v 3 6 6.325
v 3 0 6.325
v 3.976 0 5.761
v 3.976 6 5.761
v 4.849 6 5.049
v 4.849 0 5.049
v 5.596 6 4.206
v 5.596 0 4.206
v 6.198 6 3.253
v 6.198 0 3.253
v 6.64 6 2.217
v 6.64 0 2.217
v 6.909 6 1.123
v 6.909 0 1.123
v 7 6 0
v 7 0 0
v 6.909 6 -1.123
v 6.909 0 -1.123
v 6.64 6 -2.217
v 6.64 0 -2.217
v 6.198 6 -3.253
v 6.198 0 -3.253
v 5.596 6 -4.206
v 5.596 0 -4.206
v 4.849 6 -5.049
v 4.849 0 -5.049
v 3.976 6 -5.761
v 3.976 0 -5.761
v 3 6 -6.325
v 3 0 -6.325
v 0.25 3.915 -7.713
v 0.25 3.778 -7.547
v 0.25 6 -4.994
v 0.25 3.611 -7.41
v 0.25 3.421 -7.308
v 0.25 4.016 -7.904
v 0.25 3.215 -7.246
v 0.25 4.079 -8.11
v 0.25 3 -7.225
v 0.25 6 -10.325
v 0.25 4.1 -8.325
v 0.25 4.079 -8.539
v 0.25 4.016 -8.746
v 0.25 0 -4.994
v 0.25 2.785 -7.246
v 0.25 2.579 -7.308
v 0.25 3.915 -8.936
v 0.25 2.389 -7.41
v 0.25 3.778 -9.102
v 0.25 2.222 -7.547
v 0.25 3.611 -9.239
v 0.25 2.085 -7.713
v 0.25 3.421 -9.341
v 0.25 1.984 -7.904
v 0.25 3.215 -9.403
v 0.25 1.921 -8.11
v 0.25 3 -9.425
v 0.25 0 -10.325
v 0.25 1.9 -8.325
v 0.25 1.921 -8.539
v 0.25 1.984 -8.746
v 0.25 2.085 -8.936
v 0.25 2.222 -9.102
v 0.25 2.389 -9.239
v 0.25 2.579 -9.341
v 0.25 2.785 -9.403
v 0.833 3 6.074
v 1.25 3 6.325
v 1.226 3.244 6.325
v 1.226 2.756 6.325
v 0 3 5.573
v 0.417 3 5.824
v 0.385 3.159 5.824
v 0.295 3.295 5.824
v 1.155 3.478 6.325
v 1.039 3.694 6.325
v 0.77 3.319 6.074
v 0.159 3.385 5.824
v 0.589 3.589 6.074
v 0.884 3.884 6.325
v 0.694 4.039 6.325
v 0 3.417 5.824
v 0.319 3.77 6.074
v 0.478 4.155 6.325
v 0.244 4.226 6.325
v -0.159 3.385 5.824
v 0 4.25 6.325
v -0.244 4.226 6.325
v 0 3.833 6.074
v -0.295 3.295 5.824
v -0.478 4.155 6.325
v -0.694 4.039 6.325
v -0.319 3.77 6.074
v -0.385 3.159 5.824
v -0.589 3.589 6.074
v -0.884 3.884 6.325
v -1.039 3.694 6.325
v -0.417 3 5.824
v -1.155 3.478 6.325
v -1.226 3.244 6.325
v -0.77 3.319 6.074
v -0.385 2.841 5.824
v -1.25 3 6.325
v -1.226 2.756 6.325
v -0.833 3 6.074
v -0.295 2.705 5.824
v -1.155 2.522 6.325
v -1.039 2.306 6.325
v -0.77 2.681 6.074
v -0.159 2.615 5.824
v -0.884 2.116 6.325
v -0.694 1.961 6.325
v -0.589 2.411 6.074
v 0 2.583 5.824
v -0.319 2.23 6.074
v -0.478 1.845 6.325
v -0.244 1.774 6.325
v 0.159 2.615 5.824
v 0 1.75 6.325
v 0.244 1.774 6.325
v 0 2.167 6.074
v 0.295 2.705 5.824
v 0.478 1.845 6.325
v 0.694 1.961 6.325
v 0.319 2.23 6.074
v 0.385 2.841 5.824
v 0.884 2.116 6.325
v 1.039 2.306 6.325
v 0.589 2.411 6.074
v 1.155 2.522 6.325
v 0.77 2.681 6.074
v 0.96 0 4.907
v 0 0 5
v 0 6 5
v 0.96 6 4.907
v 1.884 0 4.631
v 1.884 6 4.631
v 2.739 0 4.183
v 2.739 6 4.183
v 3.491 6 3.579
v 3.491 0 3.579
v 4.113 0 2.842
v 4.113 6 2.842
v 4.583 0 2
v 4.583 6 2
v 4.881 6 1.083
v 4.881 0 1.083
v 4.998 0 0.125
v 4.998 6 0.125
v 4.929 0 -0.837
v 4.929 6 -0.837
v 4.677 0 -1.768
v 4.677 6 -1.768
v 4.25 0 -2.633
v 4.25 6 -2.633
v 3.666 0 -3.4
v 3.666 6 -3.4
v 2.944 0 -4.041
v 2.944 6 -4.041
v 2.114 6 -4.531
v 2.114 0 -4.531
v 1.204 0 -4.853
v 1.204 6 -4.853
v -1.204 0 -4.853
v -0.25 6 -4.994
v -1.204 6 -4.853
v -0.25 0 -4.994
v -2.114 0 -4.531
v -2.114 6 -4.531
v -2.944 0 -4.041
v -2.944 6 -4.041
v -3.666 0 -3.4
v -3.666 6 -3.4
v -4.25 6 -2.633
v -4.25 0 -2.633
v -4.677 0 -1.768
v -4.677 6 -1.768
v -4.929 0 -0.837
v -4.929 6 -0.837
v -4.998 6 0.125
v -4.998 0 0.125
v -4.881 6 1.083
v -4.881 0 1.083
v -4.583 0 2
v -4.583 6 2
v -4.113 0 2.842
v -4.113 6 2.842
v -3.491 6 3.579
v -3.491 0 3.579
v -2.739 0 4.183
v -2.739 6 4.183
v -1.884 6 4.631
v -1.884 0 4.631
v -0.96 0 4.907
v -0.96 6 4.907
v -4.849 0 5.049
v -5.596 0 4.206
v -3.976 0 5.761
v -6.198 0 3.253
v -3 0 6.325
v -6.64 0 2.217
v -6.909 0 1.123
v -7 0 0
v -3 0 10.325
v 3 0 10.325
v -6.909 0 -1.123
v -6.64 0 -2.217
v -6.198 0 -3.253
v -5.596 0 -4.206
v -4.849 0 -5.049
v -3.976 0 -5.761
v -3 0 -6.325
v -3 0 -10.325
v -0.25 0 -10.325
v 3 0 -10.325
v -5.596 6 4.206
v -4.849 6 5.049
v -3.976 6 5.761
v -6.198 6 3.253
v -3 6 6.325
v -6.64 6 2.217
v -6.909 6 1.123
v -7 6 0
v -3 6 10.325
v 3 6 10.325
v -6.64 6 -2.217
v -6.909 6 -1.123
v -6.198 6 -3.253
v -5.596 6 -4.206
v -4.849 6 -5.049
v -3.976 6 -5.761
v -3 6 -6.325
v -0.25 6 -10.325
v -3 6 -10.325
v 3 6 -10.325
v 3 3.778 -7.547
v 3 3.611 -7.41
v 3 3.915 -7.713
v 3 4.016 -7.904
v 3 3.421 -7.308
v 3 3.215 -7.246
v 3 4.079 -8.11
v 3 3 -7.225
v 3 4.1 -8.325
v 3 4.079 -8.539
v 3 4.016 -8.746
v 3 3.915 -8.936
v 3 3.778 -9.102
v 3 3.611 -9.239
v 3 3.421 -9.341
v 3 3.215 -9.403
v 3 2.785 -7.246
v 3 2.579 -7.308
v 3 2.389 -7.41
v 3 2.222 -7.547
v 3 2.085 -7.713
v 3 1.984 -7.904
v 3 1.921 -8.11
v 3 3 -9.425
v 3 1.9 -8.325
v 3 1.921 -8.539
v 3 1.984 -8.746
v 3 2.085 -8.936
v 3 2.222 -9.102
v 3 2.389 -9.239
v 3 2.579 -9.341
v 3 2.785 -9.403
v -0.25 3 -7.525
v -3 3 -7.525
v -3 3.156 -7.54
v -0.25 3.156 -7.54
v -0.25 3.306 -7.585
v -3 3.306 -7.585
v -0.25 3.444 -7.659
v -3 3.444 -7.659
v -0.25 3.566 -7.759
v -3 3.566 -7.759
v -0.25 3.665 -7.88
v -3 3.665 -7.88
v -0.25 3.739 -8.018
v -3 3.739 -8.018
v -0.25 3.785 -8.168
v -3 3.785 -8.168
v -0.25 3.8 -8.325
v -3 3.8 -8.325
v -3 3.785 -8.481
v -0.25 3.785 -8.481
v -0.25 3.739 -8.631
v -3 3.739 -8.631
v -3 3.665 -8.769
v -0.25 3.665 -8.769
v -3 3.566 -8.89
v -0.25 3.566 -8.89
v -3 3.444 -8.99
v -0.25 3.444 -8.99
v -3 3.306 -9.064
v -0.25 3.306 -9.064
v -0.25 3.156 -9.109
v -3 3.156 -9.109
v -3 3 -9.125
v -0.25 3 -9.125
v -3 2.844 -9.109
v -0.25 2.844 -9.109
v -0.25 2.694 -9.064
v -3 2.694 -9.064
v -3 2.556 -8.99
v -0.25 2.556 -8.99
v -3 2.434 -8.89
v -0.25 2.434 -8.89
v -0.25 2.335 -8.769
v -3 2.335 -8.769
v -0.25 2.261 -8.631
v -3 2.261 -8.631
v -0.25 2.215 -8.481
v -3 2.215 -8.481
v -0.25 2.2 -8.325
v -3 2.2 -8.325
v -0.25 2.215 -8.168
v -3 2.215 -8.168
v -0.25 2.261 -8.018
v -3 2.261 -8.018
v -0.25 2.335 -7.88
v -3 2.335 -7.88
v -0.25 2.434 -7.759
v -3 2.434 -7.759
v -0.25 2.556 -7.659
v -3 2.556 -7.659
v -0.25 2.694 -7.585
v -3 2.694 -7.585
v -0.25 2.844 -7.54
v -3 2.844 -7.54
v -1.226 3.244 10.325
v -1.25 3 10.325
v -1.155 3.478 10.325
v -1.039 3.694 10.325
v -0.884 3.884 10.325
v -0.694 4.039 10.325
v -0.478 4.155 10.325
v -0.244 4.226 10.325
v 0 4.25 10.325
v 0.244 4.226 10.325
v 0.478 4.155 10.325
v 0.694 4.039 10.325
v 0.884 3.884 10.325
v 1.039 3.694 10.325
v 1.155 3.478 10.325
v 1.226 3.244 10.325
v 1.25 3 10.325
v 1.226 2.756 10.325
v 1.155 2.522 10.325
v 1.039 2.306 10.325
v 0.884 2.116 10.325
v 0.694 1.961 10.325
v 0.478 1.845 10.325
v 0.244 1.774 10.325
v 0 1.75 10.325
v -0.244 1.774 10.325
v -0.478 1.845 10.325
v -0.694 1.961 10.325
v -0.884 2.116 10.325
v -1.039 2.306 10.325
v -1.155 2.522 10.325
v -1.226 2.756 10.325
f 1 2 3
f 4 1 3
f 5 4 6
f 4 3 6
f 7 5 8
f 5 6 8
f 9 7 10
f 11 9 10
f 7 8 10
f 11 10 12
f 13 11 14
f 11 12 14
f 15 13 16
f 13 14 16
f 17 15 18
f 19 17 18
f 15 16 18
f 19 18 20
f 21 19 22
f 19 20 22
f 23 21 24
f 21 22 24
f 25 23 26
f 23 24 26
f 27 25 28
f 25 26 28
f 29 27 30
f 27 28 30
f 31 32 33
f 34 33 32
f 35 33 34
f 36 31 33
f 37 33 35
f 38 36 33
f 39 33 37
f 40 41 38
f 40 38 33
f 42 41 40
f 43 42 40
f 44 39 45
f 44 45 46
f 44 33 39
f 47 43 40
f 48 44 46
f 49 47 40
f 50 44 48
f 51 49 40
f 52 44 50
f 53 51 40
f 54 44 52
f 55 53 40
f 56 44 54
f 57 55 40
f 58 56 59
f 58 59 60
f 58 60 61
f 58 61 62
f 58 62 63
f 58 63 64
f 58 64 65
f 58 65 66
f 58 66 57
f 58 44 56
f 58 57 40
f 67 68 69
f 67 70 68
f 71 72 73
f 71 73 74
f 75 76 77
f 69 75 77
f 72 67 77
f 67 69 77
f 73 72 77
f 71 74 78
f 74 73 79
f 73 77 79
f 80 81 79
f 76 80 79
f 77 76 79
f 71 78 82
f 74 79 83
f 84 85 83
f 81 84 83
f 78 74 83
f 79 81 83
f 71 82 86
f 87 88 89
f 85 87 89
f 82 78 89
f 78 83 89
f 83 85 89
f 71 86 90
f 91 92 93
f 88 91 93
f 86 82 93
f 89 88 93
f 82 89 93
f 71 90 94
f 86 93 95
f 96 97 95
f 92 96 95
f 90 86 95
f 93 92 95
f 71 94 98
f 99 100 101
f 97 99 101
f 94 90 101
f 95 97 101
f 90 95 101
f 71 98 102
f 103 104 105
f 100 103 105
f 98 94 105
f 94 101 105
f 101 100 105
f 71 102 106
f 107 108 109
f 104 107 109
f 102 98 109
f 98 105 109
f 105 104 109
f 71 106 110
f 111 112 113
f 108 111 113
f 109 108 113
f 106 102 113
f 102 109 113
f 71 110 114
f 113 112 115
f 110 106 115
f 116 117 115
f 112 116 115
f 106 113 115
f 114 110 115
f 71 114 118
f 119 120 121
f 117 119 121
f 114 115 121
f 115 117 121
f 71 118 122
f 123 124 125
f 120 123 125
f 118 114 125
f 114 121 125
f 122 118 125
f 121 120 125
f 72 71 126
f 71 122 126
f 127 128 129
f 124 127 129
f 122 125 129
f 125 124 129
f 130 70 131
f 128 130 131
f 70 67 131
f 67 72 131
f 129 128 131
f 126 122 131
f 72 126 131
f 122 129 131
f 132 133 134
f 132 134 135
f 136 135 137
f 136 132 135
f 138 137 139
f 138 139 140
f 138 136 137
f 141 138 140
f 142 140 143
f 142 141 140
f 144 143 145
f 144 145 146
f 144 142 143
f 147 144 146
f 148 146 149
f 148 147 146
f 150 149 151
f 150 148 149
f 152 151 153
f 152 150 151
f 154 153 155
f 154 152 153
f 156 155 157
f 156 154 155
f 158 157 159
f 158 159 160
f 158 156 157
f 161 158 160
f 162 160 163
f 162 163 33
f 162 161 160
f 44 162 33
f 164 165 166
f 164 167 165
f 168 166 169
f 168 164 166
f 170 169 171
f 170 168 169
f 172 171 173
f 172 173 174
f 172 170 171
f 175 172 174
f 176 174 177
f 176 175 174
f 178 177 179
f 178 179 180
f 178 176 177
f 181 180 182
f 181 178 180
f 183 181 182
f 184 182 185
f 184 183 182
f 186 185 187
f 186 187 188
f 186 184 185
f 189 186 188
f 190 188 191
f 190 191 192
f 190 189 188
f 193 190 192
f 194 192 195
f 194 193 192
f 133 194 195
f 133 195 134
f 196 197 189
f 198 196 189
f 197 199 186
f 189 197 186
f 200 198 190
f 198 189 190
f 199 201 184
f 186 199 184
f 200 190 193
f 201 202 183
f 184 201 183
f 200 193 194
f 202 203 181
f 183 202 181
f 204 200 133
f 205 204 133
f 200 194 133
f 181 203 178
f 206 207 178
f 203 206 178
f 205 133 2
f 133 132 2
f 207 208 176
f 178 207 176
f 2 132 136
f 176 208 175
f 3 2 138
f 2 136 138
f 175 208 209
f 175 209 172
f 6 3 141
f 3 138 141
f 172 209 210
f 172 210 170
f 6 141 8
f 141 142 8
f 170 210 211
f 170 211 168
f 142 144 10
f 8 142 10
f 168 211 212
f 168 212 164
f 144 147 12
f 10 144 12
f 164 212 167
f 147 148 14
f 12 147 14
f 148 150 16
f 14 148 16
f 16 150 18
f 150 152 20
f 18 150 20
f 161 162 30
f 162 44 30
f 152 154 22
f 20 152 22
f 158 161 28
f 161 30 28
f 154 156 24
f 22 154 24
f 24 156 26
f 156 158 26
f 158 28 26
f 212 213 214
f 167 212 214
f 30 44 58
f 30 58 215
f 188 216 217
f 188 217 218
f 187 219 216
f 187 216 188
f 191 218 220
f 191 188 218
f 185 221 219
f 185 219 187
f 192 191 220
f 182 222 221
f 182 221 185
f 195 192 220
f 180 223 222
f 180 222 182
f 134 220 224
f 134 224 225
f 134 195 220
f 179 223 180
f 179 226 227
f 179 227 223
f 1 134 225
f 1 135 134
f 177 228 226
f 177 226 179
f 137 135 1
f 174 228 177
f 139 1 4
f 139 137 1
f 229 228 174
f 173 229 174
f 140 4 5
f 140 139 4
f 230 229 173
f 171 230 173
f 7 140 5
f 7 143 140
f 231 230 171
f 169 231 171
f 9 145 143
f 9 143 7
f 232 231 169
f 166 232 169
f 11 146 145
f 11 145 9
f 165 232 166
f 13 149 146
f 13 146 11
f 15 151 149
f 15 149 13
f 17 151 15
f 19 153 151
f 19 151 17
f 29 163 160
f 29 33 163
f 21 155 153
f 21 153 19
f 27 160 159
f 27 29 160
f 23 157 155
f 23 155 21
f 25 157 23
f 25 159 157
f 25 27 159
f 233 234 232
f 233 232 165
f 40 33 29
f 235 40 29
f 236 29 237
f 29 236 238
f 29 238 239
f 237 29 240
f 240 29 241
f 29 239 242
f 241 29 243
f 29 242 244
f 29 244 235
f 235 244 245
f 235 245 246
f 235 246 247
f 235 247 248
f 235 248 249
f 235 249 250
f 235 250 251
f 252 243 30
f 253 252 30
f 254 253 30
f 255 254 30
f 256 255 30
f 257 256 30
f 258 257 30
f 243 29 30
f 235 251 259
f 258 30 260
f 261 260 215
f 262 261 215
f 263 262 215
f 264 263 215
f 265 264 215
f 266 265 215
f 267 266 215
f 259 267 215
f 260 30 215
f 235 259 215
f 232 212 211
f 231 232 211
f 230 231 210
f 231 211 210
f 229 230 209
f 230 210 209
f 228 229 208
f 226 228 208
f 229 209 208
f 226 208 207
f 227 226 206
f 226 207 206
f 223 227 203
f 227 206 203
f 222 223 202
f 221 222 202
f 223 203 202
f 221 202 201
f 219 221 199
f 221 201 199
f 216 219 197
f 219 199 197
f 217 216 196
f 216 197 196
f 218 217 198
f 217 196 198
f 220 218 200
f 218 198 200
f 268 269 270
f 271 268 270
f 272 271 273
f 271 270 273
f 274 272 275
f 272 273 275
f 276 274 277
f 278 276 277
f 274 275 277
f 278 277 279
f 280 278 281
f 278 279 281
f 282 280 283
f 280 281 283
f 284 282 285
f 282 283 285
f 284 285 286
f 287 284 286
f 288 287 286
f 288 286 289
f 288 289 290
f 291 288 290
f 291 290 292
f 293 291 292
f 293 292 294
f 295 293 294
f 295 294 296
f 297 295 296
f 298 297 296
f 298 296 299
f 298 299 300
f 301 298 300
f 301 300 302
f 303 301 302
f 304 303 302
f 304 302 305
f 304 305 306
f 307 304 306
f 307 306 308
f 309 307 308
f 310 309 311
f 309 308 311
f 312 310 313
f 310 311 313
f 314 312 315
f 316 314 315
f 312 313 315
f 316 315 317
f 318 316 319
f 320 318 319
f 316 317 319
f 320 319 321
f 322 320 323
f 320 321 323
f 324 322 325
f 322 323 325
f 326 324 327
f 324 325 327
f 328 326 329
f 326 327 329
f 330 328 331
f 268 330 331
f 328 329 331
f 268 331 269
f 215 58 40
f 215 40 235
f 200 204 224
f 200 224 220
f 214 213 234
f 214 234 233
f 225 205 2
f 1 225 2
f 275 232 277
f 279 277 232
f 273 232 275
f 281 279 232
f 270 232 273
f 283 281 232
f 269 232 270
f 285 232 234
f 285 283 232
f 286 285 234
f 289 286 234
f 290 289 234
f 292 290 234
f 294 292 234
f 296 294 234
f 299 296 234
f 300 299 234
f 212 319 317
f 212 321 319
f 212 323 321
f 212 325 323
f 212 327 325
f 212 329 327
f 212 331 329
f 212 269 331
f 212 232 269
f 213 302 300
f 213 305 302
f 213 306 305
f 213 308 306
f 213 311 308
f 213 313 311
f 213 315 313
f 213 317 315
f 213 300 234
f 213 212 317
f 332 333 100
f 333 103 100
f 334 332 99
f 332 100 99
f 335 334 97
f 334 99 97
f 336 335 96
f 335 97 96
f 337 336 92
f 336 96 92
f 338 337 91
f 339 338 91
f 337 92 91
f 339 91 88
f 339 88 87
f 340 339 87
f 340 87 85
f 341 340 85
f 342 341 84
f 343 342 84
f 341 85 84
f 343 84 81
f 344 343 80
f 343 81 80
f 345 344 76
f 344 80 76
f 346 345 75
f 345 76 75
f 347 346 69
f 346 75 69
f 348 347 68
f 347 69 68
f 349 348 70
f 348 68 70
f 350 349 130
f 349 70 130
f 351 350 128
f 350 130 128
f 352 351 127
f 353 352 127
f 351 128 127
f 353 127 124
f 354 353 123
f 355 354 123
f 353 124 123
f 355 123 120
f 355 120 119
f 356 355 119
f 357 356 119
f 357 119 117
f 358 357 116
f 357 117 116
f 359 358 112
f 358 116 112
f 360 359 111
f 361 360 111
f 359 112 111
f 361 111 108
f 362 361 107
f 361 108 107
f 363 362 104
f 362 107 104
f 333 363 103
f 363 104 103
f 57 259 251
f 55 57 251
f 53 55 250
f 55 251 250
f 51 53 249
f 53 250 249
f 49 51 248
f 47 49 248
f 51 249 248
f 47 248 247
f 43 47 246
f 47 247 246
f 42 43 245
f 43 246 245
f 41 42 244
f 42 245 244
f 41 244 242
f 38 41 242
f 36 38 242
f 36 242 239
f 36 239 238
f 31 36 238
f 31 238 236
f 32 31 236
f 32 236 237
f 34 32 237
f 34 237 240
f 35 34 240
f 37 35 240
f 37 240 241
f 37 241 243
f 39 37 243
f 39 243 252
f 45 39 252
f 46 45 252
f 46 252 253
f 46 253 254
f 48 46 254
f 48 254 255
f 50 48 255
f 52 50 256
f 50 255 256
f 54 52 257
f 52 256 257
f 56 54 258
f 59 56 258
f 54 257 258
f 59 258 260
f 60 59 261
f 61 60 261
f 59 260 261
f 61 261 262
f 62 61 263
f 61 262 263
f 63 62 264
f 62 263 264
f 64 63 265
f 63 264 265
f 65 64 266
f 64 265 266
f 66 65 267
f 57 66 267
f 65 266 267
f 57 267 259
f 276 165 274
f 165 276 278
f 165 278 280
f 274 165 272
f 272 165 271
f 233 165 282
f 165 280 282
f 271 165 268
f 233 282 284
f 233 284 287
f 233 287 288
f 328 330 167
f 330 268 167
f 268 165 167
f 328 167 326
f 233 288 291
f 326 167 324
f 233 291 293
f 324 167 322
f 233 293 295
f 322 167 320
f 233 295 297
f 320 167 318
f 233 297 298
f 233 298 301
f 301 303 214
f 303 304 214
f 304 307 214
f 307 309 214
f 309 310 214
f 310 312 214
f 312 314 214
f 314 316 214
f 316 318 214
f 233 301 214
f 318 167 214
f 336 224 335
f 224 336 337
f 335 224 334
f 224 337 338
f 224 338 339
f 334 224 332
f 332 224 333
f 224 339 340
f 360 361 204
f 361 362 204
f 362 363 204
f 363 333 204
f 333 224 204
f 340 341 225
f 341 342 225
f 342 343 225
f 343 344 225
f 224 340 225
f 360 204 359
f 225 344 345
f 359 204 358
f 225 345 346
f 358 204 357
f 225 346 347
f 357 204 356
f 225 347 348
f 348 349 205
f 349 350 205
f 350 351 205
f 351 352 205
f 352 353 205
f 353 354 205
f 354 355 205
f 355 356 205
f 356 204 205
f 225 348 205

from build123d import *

# Parameters (mm, degrees)
LOOP_SKETCH_R                   = 7
LOOP_SKETCH_R_2                 = 5
LOOP_EXTRUDE_DEPTH              = 6
BLOCK_SKETCH_W                  = 6
BLOCK_SKETCH_H                  = 4
BLOCK_EXTRUDE_DEPTH             = 6
SLOT_SKETCH_W                   = 0.5
SLOT_SKETCH_H                   = 5.330809231
SLOT_CUT_DEPTH                  = 6
M3X0_5_TAPPED_HOLE1_D           = 2.5
M3X0_5_TAPPED_HOLE1_DEPTH       = 4
M3X0_5_TAPPED_HOLE1_TIP         = 0.751075774
F_2_2_2_2_DIAMETER_HOLE1_REACH  = 17.576
F_2_2_2_2_DIAMETER_HOLE1_BORE_R = 1.1
M2X0_4_TAPPED_HOLE1_D           = 1.6


with BuildPart() as part:
    # Loop Sketch → Loop Extrude (new body)
    with BuildSketch(Plane(origin=(0, 0, 0), x_dir=(1, 0, 0), z_dir=(0, 1, 0))):
        with Locations(Location((0, 0, 0), (0, 0, 270))):
            Circle(LOOP_SKETCH_R)
        with Locations(Location((0, 0, 0), (0, 0, 270))):
            Circle(LOOP_SKETCH_R_2, mode=Mode.SUBTRACT)
    extrude(amount=LOOP_EXTRUDE_DEPTH)

    # Block Sketch → Block Extrude (add)
    with BuildSketch(Plane(origin=(0, 0, 0), x_dir=(1, 0, 0), z_dir=(0, 1, 0))):
        with Locations((0, -8.32455532)):
            Rectangle(BLOCK_SKETCH_W, BLOCK_SKETCH_H)
        with Locations((0, 8.32455532)):
            Rectangle(BLOCK_SKETCH_W, BLOCK_SKETCH_H)
    extrude(amount=BLOCK_EXTRUDE_DEPTH)

    # Slot Sketch → Slot Cut (cut)
    with BuildSketch(Plane(origin=(0, 0, 0), x_dir=(1, 0, 0), z_dir=(0, 1, 0))):
        with Locations((0, 7.659150705)):
            Rectangle(SLOT_SKETCH_W, SLOT_SKETCH_H)
    extrude(amount=SLOT_CUT_DEPTH, mode=Mode.SUBTRACT)

    # M3x0.5 Tapped Hole1
    with Locations(Plane.XY.offset(10.32455532)):
        with Locations((0, 3)):
            Hole(M3X0_5_TAPPED_HOLE1_D / 2, depth=M3X0_5_TAPPED_HOLE1_DEPTH)
            with Locations((0, 0, -(M3X0_5_TAPPED_HOLE1_DEPTH + M3X0_5_TAPPED_HOLE1_TIP / 2))):  # 118° drill point
                Cone(0, M3X0_5_TAPPED_HOLE1_D / 2, M3X0_5_TAPPED_HOLE1_TIP, mode=Mode.SUBTRACT)

    # Ø2.2 (2.2) Diameter Hole1 bore → Ø2.2 (2.2) Diameter Hole1 (cut, up to next)
    with BuildSketch(Plane(origin=(3, 0, 0), x_dir=(0, 0, -1), z_dir=(1, 0, 0)), mode=Mode.PRIVATE) as f_2_2_2_2_diameter_hole1_sk1:
        with Locations((8.32455532, 3)):
            Circle(F_2_2_2_2_DIAMETER_HOLE1_BORE_R)
    f_2_2_2_2_diameter_hole1_tool1 = extrude(f_2_2_2_2_diameter_hole1_sk1.sketch, amount=-F_2_2_2_2_DIAMETER_HOLE1_REACH, mode=Mode.PRIVATE) & part.part
    add(f_2_2_2_2_diameter_hole1_tool1.solids().sort_by_distance((3, 3, -8.324555))[0], mode=Mode.SUBTRACT)

    # M2x0.4 Tapped Hole1 (through all)
    with Locations(Plane(origin=(-0.25, 0, 0), x_dir=(0, 0, -1), z_dir=(1, 0, 0))):
        with Locations((8.32455532, 3)):
            Hole(M2X0_4_TAPPED_HOLE1_D / 2)


solid = part.part
